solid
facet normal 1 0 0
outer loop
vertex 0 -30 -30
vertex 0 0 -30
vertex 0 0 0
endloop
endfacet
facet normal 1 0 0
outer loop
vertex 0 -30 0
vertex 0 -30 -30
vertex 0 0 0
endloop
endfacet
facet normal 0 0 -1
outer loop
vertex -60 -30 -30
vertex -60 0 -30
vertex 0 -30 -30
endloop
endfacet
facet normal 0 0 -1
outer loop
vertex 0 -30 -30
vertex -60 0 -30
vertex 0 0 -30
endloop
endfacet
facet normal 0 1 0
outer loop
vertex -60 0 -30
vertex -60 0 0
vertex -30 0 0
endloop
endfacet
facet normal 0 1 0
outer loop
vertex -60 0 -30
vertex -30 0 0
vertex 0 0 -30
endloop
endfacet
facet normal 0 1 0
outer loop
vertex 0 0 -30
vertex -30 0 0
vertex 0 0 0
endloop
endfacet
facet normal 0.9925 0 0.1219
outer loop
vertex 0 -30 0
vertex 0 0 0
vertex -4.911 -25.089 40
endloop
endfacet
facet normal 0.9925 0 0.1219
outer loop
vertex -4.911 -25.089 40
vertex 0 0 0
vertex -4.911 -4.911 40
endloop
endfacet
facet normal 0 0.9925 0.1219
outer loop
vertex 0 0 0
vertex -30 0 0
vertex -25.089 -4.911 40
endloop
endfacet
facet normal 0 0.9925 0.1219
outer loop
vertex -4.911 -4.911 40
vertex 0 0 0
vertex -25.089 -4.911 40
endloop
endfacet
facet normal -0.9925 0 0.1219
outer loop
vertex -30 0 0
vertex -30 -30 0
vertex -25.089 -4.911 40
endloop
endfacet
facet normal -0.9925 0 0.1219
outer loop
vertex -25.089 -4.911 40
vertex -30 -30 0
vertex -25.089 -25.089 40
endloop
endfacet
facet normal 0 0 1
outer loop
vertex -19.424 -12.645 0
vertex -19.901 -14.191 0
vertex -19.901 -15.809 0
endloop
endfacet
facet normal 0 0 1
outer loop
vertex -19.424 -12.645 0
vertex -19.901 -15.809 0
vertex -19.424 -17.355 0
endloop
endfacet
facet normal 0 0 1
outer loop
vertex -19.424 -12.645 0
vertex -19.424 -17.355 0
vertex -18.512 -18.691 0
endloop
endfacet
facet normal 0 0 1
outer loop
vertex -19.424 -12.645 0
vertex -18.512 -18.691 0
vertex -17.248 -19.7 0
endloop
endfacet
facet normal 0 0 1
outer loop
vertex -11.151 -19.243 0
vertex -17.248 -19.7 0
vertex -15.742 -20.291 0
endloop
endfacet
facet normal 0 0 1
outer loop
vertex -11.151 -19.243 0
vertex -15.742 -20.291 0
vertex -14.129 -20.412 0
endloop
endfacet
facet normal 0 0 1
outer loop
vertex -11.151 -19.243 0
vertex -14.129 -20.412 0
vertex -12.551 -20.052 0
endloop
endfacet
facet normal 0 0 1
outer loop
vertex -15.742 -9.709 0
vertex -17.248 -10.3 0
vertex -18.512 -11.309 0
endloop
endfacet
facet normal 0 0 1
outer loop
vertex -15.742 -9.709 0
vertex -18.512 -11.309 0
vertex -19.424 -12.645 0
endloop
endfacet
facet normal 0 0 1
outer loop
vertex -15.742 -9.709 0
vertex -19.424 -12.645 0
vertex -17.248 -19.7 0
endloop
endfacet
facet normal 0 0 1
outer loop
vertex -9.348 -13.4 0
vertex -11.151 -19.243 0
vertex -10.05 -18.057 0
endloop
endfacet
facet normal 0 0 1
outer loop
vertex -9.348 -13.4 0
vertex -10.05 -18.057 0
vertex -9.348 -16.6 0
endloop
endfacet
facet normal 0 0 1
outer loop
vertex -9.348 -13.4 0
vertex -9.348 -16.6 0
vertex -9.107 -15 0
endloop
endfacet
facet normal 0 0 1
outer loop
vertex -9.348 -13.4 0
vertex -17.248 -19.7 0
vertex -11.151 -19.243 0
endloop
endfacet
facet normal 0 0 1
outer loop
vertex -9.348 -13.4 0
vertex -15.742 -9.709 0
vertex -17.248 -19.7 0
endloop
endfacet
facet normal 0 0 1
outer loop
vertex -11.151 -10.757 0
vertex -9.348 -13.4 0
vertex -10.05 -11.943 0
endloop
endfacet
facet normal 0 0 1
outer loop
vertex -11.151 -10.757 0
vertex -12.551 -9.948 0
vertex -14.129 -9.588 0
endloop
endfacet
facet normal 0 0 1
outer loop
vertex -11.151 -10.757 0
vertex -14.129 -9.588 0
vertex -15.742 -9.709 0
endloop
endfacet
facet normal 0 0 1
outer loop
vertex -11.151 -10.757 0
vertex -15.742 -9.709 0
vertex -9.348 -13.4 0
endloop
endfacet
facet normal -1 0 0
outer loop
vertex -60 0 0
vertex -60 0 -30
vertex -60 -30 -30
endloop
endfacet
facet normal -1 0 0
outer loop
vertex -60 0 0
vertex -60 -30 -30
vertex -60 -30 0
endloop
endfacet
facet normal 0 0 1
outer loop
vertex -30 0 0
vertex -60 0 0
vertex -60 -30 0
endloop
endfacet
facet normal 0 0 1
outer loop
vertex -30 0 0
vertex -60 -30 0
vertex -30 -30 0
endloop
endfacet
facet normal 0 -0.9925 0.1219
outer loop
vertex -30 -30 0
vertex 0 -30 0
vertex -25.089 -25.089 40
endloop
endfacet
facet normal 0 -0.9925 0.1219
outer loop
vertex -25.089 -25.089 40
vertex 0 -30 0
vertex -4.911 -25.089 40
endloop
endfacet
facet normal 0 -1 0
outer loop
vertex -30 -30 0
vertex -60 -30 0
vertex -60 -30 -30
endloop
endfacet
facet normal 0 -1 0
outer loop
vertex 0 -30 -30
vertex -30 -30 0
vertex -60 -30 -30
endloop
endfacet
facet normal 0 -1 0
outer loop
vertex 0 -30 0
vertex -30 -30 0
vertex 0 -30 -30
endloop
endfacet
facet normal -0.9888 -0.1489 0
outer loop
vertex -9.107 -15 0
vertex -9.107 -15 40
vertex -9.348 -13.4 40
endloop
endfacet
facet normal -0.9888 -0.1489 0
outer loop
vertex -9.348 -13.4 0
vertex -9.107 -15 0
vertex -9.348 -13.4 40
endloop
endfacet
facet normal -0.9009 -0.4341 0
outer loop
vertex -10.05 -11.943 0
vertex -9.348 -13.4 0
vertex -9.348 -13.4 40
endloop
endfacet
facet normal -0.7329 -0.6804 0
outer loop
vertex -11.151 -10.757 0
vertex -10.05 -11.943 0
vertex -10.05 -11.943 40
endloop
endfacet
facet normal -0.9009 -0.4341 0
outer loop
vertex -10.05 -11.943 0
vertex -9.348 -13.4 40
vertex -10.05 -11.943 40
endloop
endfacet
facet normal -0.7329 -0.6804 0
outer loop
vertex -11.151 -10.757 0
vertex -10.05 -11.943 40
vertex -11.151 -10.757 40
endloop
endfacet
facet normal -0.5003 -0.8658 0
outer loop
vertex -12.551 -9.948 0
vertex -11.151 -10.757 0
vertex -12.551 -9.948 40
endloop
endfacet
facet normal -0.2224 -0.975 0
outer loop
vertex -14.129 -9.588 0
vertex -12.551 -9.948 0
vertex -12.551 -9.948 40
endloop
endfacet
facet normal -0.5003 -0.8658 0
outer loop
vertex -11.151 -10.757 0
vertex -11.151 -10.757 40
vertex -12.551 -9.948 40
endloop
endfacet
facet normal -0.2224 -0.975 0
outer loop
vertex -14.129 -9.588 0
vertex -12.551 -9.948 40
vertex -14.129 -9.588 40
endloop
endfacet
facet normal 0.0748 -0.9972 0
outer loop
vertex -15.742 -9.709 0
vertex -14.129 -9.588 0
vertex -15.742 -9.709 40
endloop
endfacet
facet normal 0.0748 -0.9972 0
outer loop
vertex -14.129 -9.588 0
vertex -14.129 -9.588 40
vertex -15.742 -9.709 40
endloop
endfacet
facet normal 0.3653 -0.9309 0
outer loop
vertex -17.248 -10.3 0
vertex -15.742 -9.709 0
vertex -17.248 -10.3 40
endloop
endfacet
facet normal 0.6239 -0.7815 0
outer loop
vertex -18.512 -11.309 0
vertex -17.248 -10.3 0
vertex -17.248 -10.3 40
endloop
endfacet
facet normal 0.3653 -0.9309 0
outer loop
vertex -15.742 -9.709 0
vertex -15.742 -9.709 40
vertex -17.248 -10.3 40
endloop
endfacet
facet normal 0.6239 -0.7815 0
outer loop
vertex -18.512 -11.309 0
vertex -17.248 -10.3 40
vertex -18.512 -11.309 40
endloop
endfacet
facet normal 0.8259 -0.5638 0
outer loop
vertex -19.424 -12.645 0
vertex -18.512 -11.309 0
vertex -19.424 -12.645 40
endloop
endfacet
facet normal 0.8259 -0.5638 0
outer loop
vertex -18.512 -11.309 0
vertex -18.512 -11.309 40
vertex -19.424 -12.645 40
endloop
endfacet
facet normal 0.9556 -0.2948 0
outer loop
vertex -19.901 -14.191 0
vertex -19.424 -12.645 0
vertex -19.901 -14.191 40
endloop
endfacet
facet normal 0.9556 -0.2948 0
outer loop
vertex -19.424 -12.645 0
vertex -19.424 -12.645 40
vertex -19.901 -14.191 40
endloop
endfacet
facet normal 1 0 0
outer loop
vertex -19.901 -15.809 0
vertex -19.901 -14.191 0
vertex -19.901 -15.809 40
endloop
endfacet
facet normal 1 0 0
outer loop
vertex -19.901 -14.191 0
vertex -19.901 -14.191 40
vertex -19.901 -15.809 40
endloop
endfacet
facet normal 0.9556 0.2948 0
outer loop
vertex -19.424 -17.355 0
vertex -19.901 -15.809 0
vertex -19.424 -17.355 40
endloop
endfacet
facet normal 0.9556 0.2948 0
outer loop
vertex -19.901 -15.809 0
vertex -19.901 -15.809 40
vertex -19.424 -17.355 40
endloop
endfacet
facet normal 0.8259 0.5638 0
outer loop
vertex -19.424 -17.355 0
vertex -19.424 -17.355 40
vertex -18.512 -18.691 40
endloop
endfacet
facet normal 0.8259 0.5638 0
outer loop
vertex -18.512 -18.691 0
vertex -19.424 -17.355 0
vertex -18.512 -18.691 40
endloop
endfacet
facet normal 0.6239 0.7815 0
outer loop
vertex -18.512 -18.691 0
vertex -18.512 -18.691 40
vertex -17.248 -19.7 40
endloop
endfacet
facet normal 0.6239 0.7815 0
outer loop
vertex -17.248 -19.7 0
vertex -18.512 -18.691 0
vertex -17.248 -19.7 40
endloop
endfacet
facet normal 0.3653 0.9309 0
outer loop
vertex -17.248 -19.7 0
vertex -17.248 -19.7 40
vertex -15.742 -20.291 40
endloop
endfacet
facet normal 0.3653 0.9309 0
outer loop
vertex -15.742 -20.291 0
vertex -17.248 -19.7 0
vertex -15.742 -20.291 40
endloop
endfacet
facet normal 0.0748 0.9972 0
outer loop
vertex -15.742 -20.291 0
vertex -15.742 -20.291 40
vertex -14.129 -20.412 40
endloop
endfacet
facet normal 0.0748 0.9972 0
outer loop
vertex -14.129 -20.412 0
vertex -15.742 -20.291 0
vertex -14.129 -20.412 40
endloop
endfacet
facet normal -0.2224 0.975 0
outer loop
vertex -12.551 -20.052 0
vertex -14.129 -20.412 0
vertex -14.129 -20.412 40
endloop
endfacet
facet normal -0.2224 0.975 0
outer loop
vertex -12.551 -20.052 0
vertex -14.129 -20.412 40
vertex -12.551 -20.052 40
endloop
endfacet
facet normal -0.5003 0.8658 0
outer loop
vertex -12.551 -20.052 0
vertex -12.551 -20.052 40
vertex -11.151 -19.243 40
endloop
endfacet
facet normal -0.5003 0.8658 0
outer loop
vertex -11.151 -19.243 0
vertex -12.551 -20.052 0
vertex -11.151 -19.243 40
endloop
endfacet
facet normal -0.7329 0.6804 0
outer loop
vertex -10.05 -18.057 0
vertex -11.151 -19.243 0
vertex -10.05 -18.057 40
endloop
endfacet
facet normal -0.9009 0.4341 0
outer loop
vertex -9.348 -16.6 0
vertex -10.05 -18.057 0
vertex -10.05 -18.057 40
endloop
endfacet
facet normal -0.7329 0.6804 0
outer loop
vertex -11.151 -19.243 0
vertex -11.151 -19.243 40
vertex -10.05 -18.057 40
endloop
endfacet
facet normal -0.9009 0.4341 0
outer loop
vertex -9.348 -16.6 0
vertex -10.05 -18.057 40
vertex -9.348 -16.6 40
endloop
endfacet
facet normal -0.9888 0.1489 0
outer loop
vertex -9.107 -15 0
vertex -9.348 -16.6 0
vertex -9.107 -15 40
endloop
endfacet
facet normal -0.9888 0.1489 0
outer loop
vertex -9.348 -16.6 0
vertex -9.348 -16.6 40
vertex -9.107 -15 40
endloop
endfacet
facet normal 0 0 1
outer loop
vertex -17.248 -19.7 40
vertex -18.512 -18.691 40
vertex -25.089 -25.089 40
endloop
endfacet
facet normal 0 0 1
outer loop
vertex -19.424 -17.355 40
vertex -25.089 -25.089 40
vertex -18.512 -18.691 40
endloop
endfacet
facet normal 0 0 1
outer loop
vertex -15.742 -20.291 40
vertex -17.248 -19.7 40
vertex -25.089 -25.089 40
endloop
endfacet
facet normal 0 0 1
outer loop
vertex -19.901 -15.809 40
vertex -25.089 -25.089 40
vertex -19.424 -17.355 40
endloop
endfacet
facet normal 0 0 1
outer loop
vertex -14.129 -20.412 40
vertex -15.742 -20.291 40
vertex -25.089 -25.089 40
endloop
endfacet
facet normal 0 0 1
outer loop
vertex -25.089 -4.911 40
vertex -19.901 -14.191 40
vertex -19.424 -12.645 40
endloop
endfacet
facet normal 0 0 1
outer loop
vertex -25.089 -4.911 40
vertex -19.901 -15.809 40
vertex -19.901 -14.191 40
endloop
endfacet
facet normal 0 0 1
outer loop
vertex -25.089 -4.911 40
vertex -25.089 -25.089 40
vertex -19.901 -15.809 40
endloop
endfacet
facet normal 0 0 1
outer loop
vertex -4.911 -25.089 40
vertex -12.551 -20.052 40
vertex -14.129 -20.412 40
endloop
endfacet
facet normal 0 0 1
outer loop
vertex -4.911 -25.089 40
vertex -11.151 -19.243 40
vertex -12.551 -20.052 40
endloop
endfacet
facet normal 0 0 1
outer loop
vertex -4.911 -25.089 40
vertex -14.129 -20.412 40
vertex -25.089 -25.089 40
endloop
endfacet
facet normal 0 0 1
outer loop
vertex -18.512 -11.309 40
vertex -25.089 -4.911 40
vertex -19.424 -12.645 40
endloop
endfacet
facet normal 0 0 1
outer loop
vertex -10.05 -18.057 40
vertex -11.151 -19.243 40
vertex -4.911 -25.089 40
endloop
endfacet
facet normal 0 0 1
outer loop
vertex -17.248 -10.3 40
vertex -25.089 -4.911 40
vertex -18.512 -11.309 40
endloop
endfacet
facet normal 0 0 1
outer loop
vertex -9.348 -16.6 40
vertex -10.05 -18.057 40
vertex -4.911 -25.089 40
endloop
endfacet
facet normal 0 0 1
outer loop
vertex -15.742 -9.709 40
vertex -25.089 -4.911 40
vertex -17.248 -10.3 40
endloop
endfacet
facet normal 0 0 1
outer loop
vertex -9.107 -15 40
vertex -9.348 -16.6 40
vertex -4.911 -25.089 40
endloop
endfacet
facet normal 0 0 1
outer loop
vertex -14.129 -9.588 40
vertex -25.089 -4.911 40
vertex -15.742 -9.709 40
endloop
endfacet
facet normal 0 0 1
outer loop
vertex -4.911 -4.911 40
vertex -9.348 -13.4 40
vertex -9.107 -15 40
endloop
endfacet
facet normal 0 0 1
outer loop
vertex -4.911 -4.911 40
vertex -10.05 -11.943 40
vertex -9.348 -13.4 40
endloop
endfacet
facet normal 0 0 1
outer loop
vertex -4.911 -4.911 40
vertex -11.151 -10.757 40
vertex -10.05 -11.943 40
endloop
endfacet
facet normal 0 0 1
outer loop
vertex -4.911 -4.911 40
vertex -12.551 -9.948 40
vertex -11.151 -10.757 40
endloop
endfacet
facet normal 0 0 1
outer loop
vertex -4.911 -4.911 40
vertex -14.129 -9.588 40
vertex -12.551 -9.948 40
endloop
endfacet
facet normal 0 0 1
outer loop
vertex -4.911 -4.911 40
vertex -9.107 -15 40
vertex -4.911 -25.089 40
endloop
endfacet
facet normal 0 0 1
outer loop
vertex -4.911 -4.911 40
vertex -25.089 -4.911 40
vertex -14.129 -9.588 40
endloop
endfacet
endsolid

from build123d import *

# Parameters (mm, degrees)
F0_W     = 60
F0_H     = 30
F1_DEPTH = 30
F2_W     = 30
F2_H     = 30
F3_DEPTH = 40
F3_TAPER = 7
F4_R     = 5.4270060884
F5_DEPTH = 40


with BuildPart() as f1:
    # F0 (on Front) → F1 (new body)
    with BuildSketch(Plane.XZ):
        with Locations((-30, -15)):
            Rectangle(F0_W, F0_H)
    extrude(amount=F1_DEPTH)

    # F2 (on face) → F3 (join)
    with BuildSketch(Plane.XY):
        with Locations((-15, -15)):
            Rectangle(F2_W, F2_H)
    extrude(amount=F3_DEPTH, taper=F3_TAPER)

    # F4 (on face) → F5 (cut)
    with BuildSketch(Plane.XY.offset(40)):
        with Locations((-14.5341902971, -15)):
            Circle(F4_R)
    extrude(amount=-F5_DEPTH, mode=Mode.SUBTRACT)


solid = f1.part
